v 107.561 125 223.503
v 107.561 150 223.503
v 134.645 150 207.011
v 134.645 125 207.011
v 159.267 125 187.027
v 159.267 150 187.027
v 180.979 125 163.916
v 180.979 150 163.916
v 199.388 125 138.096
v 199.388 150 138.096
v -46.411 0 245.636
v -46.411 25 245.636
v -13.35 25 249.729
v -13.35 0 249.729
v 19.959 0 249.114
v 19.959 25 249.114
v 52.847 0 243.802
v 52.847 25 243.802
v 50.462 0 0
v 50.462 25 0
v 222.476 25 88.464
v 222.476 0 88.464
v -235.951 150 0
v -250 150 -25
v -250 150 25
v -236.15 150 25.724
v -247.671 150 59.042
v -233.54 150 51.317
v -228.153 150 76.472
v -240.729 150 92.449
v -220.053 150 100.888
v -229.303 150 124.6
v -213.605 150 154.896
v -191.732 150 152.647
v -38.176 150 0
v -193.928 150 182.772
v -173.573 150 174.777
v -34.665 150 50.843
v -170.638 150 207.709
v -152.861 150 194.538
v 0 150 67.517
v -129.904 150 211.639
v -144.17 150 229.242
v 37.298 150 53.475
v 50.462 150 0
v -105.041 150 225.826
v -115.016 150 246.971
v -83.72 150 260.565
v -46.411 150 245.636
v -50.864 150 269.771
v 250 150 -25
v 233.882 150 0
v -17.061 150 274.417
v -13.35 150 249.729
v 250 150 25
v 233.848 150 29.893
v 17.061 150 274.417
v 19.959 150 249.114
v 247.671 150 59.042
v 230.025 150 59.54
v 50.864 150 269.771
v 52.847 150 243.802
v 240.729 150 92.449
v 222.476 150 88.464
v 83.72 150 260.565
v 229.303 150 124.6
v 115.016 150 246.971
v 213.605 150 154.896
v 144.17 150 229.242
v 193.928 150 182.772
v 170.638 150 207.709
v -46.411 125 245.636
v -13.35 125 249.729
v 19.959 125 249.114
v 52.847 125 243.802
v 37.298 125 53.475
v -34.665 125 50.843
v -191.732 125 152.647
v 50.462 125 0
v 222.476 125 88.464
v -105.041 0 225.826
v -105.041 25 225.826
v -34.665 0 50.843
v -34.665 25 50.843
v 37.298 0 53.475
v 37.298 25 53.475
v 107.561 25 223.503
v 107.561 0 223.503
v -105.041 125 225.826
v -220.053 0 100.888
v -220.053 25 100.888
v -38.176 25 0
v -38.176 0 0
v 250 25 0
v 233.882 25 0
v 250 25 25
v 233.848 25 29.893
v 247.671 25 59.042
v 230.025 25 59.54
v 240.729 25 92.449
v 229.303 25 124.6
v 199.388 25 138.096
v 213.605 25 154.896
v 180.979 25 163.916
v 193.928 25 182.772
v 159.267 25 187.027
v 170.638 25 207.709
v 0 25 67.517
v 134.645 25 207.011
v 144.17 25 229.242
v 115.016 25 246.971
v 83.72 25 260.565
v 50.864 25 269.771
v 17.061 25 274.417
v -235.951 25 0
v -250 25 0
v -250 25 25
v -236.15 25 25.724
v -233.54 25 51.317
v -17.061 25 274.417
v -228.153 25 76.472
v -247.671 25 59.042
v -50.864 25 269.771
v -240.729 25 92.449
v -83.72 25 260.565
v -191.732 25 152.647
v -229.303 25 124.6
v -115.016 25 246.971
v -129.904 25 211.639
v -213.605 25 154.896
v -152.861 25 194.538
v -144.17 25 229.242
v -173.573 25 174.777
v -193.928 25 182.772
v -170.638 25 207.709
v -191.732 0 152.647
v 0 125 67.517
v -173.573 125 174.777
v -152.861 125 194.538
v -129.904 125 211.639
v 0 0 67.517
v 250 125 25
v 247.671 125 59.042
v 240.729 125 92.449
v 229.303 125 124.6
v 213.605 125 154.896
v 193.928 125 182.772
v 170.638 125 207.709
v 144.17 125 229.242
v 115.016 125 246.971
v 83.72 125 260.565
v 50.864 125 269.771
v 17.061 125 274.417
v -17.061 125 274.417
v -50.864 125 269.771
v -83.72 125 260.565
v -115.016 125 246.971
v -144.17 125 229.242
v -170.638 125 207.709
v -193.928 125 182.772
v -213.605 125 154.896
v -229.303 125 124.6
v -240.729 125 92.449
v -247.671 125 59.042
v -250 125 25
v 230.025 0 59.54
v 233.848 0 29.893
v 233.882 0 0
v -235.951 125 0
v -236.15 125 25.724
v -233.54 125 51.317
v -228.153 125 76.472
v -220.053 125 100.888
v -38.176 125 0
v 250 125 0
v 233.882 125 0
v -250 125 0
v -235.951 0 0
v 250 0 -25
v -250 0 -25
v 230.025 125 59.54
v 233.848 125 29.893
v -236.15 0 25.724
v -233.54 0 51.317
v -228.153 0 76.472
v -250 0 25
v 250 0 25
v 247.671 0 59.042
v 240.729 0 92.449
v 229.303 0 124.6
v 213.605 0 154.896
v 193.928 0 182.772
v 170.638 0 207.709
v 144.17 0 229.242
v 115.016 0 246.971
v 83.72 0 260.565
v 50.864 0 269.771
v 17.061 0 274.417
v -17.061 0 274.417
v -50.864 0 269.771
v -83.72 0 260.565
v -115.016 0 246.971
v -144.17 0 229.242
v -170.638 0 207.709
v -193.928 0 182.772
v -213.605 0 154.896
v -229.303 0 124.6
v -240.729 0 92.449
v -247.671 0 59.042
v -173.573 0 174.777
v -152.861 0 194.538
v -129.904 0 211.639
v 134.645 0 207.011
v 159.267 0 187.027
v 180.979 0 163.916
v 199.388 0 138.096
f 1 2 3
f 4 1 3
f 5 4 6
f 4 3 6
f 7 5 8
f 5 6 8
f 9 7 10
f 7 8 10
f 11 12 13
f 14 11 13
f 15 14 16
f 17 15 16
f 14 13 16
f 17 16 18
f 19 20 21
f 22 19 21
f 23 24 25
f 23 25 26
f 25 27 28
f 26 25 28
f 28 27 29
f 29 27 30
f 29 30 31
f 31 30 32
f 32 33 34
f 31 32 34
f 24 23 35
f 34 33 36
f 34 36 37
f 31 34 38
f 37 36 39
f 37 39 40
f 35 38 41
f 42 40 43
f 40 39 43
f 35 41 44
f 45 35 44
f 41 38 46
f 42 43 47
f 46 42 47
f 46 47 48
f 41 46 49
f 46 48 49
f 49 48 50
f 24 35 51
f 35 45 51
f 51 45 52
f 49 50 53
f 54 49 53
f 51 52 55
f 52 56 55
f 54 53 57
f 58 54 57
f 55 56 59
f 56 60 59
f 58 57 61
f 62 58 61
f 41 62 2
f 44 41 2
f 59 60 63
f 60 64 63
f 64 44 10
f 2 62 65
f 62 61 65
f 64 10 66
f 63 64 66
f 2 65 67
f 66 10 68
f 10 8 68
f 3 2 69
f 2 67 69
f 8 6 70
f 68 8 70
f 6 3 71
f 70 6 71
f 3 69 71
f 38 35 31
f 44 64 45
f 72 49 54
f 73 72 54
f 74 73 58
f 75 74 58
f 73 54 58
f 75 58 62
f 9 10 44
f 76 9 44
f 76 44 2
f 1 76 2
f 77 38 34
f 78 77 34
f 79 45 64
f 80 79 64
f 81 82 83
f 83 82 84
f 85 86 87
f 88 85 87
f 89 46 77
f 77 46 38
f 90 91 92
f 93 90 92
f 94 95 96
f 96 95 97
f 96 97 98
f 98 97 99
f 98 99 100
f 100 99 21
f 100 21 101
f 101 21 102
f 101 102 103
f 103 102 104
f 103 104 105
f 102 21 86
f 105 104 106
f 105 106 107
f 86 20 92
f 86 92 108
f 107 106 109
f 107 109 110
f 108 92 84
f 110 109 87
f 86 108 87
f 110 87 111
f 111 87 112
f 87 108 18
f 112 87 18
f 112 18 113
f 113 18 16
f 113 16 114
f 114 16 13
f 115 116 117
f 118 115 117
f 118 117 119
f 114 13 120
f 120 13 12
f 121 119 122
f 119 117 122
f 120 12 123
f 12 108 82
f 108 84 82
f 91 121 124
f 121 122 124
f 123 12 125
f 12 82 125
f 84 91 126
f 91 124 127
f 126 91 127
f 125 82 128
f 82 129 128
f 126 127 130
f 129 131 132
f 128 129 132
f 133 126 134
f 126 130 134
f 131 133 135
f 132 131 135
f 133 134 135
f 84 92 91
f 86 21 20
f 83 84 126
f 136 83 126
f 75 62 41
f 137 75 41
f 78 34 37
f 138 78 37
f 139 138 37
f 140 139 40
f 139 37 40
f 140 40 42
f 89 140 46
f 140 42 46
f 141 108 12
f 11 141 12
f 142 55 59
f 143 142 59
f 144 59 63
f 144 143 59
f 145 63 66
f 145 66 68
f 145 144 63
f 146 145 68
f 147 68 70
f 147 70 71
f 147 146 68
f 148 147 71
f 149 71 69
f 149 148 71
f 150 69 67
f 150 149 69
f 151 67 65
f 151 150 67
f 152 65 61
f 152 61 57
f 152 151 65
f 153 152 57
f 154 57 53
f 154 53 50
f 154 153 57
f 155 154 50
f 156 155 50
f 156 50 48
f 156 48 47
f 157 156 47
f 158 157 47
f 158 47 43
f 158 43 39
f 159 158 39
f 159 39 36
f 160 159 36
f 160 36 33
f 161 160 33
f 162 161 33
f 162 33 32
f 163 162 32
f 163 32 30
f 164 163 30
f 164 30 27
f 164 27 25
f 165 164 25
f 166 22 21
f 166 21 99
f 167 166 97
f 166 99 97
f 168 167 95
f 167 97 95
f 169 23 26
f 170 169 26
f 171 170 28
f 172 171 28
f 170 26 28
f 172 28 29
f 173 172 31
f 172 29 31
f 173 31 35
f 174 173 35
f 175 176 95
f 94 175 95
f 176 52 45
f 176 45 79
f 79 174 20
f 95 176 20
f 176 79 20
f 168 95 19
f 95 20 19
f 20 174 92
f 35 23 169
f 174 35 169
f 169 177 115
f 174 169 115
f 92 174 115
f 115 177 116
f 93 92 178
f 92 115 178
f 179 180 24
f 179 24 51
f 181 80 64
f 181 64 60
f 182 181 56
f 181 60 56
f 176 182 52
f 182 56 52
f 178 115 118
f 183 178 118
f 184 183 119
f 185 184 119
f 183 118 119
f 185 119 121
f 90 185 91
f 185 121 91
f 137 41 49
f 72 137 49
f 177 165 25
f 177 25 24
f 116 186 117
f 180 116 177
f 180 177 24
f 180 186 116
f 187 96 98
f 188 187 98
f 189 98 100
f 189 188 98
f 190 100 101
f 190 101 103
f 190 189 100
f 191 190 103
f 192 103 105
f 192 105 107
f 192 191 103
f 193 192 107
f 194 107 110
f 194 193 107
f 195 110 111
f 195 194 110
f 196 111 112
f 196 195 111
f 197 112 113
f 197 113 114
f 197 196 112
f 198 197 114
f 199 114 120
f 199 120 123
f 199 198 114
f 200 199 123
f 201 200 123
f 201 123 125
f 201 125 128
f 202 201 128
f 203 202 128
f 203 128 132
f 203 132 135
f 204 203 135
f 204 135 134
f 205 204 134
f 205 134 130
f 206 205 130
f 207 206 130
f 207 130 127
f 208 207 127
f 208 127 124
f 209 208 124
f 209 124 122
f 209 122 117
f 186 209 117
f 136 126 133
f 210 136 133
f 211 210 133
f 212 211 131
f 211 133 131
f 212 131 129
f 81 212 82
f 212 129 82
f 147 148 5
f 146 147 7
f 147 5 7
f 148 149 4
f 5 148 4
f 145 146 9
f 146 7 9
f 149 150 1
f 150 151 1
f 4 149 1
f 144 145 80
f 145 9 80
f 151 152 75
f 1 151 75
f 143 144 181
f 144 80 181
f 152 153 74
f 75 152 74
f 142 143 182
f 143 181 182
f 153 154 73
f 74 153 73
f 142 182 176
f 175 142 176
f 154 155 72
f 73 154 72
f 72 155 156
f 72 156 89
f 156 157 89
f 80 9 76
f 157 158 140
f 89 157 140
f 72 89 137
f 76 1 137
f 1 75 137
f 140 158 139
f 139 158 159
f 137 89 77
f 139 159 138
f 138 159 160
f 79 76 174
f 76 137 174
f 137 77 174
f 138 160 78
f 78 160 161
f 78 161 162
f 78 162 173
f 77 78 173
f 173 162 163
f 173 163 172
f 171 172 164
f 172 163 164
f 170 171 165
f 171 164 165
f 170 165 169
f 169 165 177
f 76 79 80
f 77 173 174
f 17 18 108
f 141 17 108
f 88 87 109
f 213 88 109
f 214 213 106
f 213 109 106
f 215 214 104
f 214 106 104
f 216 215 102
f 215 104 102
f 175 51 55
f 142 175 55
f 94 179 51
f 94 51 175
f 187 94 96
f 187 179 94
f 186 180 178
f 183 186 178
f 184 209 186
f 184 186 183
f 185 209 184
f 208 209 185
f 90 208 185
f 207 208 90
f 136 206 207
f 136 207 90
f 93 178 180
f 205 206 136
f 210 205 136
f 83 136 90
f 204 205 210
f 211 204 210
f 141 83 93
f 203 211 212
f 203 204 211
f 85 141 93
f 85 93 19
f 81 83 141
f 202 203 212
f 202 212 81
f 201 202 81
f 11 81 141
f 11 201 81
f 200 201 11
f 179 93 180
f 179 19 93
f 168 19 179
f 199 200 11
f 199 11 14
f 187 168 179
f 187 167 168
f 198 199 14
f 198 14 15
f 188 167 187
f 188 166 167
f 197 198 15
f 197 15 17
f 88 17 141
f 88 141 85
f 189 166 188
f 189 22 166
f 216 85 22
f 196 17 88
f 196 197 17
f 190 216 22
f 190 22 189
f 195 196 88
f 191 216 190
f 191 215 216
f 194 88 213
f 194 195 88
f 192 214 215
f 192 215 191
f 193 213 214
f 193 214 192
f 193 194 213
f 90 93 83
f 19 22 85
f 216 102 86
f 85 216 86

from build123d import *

# Parameters (mm, degrees)
F1_DEPTH = 150
F2_W     = 100
F2_H     = 297.664444
F2_H_2   = 25
F3_DEPTH = 10000
F5_DEPTH = 10000


with BuildPart() as f1:
    # F0 (on Front) → F1 (new body)
    with BuildSketch(Plane.XZ):
        with BuildLine():
            Line((-250, -25), (250, -25))
            Line((250, -25), (250, 25))
            ThreePointArc((250, 25), (0, 275), (-250, 25))
            Line((-250, 25), (-250, -25))
        make_face()
    extrude(amount=-F1_DEPTH)

    # F2 (on face) → F3 (cut)
    with BuildSketch(Plane(origin=(-250, 0, 0), x_dir=(0, -1, 0), z_dir=(-1, 0, 0))):
        with Locations((-75, 173.832222)):
            Rectangle(F2_W, F2_H)
        with Locations((-75, 12.5)):
            Rectangle(F2_W, F2_H_2)
    extrude(amount=-F3_DEPTH, mode=Mode.SUBTRACT)

    # F4 (on face) → F5 (cut)
    with BuildSketch(Plane(origin=(0, 150, 0), x_dir=(-1, 0, 0), z_dir=(0, 1, 0))):
        with BuildLine():
            Line((-233.881947, 0), (-50.46213, 0))
            Line((-50.46213, 0), (-222.4755, 88.46351))
            ThreePointArc((-222.4755, 88.46351), (-232.40746, 44.777007), (-233.881947, 0))
        make_face()
        with BuildLine():
            Line((-37.298094, 53.475399), (-107.561018, 223.502855))
            ThreePointArc((-107.561018, 223.502855), (-159.267001, 187.027318), (-199.387616, 138.095635))
            Line((-199.387616, 138.095635), (-37.298094, 53.475399))
        make_face()
        with BuildLine():
            Line((0, 67.517042), (46.411204, 245.636359))
            ThreePointArc((46.411204, 245.636359), (-3.315529, 250.011517), (-52.846596, 243.801574))
            Line((-52.846596, 243.801574), (0, 67.517042))
        make_face()
        with BuildLine():
            Line((34.665316, 50.842591), (191.731855, 152.647342))
            ThreePointArc((191.731855, 152.647342), (152.861228, 194.537882), (105.04086, 225.826144))
            Line((105.04086, 225.826144), (34.665316, 50.842591))
        make_face()
        with BuildLine():
            ThreePointArc((235.951228, 0), (233.540018, 51.316805), (220.052612, 100.88815))
            Line((220.052612, 100.88815), (38.175728, 0))
            Line((38.175728, 0), (235.951228, 0))
        make_face()
    extrude(amount=-F5_DEPTH, mode=Mode.SUBTRACT)


solid = f1.part
